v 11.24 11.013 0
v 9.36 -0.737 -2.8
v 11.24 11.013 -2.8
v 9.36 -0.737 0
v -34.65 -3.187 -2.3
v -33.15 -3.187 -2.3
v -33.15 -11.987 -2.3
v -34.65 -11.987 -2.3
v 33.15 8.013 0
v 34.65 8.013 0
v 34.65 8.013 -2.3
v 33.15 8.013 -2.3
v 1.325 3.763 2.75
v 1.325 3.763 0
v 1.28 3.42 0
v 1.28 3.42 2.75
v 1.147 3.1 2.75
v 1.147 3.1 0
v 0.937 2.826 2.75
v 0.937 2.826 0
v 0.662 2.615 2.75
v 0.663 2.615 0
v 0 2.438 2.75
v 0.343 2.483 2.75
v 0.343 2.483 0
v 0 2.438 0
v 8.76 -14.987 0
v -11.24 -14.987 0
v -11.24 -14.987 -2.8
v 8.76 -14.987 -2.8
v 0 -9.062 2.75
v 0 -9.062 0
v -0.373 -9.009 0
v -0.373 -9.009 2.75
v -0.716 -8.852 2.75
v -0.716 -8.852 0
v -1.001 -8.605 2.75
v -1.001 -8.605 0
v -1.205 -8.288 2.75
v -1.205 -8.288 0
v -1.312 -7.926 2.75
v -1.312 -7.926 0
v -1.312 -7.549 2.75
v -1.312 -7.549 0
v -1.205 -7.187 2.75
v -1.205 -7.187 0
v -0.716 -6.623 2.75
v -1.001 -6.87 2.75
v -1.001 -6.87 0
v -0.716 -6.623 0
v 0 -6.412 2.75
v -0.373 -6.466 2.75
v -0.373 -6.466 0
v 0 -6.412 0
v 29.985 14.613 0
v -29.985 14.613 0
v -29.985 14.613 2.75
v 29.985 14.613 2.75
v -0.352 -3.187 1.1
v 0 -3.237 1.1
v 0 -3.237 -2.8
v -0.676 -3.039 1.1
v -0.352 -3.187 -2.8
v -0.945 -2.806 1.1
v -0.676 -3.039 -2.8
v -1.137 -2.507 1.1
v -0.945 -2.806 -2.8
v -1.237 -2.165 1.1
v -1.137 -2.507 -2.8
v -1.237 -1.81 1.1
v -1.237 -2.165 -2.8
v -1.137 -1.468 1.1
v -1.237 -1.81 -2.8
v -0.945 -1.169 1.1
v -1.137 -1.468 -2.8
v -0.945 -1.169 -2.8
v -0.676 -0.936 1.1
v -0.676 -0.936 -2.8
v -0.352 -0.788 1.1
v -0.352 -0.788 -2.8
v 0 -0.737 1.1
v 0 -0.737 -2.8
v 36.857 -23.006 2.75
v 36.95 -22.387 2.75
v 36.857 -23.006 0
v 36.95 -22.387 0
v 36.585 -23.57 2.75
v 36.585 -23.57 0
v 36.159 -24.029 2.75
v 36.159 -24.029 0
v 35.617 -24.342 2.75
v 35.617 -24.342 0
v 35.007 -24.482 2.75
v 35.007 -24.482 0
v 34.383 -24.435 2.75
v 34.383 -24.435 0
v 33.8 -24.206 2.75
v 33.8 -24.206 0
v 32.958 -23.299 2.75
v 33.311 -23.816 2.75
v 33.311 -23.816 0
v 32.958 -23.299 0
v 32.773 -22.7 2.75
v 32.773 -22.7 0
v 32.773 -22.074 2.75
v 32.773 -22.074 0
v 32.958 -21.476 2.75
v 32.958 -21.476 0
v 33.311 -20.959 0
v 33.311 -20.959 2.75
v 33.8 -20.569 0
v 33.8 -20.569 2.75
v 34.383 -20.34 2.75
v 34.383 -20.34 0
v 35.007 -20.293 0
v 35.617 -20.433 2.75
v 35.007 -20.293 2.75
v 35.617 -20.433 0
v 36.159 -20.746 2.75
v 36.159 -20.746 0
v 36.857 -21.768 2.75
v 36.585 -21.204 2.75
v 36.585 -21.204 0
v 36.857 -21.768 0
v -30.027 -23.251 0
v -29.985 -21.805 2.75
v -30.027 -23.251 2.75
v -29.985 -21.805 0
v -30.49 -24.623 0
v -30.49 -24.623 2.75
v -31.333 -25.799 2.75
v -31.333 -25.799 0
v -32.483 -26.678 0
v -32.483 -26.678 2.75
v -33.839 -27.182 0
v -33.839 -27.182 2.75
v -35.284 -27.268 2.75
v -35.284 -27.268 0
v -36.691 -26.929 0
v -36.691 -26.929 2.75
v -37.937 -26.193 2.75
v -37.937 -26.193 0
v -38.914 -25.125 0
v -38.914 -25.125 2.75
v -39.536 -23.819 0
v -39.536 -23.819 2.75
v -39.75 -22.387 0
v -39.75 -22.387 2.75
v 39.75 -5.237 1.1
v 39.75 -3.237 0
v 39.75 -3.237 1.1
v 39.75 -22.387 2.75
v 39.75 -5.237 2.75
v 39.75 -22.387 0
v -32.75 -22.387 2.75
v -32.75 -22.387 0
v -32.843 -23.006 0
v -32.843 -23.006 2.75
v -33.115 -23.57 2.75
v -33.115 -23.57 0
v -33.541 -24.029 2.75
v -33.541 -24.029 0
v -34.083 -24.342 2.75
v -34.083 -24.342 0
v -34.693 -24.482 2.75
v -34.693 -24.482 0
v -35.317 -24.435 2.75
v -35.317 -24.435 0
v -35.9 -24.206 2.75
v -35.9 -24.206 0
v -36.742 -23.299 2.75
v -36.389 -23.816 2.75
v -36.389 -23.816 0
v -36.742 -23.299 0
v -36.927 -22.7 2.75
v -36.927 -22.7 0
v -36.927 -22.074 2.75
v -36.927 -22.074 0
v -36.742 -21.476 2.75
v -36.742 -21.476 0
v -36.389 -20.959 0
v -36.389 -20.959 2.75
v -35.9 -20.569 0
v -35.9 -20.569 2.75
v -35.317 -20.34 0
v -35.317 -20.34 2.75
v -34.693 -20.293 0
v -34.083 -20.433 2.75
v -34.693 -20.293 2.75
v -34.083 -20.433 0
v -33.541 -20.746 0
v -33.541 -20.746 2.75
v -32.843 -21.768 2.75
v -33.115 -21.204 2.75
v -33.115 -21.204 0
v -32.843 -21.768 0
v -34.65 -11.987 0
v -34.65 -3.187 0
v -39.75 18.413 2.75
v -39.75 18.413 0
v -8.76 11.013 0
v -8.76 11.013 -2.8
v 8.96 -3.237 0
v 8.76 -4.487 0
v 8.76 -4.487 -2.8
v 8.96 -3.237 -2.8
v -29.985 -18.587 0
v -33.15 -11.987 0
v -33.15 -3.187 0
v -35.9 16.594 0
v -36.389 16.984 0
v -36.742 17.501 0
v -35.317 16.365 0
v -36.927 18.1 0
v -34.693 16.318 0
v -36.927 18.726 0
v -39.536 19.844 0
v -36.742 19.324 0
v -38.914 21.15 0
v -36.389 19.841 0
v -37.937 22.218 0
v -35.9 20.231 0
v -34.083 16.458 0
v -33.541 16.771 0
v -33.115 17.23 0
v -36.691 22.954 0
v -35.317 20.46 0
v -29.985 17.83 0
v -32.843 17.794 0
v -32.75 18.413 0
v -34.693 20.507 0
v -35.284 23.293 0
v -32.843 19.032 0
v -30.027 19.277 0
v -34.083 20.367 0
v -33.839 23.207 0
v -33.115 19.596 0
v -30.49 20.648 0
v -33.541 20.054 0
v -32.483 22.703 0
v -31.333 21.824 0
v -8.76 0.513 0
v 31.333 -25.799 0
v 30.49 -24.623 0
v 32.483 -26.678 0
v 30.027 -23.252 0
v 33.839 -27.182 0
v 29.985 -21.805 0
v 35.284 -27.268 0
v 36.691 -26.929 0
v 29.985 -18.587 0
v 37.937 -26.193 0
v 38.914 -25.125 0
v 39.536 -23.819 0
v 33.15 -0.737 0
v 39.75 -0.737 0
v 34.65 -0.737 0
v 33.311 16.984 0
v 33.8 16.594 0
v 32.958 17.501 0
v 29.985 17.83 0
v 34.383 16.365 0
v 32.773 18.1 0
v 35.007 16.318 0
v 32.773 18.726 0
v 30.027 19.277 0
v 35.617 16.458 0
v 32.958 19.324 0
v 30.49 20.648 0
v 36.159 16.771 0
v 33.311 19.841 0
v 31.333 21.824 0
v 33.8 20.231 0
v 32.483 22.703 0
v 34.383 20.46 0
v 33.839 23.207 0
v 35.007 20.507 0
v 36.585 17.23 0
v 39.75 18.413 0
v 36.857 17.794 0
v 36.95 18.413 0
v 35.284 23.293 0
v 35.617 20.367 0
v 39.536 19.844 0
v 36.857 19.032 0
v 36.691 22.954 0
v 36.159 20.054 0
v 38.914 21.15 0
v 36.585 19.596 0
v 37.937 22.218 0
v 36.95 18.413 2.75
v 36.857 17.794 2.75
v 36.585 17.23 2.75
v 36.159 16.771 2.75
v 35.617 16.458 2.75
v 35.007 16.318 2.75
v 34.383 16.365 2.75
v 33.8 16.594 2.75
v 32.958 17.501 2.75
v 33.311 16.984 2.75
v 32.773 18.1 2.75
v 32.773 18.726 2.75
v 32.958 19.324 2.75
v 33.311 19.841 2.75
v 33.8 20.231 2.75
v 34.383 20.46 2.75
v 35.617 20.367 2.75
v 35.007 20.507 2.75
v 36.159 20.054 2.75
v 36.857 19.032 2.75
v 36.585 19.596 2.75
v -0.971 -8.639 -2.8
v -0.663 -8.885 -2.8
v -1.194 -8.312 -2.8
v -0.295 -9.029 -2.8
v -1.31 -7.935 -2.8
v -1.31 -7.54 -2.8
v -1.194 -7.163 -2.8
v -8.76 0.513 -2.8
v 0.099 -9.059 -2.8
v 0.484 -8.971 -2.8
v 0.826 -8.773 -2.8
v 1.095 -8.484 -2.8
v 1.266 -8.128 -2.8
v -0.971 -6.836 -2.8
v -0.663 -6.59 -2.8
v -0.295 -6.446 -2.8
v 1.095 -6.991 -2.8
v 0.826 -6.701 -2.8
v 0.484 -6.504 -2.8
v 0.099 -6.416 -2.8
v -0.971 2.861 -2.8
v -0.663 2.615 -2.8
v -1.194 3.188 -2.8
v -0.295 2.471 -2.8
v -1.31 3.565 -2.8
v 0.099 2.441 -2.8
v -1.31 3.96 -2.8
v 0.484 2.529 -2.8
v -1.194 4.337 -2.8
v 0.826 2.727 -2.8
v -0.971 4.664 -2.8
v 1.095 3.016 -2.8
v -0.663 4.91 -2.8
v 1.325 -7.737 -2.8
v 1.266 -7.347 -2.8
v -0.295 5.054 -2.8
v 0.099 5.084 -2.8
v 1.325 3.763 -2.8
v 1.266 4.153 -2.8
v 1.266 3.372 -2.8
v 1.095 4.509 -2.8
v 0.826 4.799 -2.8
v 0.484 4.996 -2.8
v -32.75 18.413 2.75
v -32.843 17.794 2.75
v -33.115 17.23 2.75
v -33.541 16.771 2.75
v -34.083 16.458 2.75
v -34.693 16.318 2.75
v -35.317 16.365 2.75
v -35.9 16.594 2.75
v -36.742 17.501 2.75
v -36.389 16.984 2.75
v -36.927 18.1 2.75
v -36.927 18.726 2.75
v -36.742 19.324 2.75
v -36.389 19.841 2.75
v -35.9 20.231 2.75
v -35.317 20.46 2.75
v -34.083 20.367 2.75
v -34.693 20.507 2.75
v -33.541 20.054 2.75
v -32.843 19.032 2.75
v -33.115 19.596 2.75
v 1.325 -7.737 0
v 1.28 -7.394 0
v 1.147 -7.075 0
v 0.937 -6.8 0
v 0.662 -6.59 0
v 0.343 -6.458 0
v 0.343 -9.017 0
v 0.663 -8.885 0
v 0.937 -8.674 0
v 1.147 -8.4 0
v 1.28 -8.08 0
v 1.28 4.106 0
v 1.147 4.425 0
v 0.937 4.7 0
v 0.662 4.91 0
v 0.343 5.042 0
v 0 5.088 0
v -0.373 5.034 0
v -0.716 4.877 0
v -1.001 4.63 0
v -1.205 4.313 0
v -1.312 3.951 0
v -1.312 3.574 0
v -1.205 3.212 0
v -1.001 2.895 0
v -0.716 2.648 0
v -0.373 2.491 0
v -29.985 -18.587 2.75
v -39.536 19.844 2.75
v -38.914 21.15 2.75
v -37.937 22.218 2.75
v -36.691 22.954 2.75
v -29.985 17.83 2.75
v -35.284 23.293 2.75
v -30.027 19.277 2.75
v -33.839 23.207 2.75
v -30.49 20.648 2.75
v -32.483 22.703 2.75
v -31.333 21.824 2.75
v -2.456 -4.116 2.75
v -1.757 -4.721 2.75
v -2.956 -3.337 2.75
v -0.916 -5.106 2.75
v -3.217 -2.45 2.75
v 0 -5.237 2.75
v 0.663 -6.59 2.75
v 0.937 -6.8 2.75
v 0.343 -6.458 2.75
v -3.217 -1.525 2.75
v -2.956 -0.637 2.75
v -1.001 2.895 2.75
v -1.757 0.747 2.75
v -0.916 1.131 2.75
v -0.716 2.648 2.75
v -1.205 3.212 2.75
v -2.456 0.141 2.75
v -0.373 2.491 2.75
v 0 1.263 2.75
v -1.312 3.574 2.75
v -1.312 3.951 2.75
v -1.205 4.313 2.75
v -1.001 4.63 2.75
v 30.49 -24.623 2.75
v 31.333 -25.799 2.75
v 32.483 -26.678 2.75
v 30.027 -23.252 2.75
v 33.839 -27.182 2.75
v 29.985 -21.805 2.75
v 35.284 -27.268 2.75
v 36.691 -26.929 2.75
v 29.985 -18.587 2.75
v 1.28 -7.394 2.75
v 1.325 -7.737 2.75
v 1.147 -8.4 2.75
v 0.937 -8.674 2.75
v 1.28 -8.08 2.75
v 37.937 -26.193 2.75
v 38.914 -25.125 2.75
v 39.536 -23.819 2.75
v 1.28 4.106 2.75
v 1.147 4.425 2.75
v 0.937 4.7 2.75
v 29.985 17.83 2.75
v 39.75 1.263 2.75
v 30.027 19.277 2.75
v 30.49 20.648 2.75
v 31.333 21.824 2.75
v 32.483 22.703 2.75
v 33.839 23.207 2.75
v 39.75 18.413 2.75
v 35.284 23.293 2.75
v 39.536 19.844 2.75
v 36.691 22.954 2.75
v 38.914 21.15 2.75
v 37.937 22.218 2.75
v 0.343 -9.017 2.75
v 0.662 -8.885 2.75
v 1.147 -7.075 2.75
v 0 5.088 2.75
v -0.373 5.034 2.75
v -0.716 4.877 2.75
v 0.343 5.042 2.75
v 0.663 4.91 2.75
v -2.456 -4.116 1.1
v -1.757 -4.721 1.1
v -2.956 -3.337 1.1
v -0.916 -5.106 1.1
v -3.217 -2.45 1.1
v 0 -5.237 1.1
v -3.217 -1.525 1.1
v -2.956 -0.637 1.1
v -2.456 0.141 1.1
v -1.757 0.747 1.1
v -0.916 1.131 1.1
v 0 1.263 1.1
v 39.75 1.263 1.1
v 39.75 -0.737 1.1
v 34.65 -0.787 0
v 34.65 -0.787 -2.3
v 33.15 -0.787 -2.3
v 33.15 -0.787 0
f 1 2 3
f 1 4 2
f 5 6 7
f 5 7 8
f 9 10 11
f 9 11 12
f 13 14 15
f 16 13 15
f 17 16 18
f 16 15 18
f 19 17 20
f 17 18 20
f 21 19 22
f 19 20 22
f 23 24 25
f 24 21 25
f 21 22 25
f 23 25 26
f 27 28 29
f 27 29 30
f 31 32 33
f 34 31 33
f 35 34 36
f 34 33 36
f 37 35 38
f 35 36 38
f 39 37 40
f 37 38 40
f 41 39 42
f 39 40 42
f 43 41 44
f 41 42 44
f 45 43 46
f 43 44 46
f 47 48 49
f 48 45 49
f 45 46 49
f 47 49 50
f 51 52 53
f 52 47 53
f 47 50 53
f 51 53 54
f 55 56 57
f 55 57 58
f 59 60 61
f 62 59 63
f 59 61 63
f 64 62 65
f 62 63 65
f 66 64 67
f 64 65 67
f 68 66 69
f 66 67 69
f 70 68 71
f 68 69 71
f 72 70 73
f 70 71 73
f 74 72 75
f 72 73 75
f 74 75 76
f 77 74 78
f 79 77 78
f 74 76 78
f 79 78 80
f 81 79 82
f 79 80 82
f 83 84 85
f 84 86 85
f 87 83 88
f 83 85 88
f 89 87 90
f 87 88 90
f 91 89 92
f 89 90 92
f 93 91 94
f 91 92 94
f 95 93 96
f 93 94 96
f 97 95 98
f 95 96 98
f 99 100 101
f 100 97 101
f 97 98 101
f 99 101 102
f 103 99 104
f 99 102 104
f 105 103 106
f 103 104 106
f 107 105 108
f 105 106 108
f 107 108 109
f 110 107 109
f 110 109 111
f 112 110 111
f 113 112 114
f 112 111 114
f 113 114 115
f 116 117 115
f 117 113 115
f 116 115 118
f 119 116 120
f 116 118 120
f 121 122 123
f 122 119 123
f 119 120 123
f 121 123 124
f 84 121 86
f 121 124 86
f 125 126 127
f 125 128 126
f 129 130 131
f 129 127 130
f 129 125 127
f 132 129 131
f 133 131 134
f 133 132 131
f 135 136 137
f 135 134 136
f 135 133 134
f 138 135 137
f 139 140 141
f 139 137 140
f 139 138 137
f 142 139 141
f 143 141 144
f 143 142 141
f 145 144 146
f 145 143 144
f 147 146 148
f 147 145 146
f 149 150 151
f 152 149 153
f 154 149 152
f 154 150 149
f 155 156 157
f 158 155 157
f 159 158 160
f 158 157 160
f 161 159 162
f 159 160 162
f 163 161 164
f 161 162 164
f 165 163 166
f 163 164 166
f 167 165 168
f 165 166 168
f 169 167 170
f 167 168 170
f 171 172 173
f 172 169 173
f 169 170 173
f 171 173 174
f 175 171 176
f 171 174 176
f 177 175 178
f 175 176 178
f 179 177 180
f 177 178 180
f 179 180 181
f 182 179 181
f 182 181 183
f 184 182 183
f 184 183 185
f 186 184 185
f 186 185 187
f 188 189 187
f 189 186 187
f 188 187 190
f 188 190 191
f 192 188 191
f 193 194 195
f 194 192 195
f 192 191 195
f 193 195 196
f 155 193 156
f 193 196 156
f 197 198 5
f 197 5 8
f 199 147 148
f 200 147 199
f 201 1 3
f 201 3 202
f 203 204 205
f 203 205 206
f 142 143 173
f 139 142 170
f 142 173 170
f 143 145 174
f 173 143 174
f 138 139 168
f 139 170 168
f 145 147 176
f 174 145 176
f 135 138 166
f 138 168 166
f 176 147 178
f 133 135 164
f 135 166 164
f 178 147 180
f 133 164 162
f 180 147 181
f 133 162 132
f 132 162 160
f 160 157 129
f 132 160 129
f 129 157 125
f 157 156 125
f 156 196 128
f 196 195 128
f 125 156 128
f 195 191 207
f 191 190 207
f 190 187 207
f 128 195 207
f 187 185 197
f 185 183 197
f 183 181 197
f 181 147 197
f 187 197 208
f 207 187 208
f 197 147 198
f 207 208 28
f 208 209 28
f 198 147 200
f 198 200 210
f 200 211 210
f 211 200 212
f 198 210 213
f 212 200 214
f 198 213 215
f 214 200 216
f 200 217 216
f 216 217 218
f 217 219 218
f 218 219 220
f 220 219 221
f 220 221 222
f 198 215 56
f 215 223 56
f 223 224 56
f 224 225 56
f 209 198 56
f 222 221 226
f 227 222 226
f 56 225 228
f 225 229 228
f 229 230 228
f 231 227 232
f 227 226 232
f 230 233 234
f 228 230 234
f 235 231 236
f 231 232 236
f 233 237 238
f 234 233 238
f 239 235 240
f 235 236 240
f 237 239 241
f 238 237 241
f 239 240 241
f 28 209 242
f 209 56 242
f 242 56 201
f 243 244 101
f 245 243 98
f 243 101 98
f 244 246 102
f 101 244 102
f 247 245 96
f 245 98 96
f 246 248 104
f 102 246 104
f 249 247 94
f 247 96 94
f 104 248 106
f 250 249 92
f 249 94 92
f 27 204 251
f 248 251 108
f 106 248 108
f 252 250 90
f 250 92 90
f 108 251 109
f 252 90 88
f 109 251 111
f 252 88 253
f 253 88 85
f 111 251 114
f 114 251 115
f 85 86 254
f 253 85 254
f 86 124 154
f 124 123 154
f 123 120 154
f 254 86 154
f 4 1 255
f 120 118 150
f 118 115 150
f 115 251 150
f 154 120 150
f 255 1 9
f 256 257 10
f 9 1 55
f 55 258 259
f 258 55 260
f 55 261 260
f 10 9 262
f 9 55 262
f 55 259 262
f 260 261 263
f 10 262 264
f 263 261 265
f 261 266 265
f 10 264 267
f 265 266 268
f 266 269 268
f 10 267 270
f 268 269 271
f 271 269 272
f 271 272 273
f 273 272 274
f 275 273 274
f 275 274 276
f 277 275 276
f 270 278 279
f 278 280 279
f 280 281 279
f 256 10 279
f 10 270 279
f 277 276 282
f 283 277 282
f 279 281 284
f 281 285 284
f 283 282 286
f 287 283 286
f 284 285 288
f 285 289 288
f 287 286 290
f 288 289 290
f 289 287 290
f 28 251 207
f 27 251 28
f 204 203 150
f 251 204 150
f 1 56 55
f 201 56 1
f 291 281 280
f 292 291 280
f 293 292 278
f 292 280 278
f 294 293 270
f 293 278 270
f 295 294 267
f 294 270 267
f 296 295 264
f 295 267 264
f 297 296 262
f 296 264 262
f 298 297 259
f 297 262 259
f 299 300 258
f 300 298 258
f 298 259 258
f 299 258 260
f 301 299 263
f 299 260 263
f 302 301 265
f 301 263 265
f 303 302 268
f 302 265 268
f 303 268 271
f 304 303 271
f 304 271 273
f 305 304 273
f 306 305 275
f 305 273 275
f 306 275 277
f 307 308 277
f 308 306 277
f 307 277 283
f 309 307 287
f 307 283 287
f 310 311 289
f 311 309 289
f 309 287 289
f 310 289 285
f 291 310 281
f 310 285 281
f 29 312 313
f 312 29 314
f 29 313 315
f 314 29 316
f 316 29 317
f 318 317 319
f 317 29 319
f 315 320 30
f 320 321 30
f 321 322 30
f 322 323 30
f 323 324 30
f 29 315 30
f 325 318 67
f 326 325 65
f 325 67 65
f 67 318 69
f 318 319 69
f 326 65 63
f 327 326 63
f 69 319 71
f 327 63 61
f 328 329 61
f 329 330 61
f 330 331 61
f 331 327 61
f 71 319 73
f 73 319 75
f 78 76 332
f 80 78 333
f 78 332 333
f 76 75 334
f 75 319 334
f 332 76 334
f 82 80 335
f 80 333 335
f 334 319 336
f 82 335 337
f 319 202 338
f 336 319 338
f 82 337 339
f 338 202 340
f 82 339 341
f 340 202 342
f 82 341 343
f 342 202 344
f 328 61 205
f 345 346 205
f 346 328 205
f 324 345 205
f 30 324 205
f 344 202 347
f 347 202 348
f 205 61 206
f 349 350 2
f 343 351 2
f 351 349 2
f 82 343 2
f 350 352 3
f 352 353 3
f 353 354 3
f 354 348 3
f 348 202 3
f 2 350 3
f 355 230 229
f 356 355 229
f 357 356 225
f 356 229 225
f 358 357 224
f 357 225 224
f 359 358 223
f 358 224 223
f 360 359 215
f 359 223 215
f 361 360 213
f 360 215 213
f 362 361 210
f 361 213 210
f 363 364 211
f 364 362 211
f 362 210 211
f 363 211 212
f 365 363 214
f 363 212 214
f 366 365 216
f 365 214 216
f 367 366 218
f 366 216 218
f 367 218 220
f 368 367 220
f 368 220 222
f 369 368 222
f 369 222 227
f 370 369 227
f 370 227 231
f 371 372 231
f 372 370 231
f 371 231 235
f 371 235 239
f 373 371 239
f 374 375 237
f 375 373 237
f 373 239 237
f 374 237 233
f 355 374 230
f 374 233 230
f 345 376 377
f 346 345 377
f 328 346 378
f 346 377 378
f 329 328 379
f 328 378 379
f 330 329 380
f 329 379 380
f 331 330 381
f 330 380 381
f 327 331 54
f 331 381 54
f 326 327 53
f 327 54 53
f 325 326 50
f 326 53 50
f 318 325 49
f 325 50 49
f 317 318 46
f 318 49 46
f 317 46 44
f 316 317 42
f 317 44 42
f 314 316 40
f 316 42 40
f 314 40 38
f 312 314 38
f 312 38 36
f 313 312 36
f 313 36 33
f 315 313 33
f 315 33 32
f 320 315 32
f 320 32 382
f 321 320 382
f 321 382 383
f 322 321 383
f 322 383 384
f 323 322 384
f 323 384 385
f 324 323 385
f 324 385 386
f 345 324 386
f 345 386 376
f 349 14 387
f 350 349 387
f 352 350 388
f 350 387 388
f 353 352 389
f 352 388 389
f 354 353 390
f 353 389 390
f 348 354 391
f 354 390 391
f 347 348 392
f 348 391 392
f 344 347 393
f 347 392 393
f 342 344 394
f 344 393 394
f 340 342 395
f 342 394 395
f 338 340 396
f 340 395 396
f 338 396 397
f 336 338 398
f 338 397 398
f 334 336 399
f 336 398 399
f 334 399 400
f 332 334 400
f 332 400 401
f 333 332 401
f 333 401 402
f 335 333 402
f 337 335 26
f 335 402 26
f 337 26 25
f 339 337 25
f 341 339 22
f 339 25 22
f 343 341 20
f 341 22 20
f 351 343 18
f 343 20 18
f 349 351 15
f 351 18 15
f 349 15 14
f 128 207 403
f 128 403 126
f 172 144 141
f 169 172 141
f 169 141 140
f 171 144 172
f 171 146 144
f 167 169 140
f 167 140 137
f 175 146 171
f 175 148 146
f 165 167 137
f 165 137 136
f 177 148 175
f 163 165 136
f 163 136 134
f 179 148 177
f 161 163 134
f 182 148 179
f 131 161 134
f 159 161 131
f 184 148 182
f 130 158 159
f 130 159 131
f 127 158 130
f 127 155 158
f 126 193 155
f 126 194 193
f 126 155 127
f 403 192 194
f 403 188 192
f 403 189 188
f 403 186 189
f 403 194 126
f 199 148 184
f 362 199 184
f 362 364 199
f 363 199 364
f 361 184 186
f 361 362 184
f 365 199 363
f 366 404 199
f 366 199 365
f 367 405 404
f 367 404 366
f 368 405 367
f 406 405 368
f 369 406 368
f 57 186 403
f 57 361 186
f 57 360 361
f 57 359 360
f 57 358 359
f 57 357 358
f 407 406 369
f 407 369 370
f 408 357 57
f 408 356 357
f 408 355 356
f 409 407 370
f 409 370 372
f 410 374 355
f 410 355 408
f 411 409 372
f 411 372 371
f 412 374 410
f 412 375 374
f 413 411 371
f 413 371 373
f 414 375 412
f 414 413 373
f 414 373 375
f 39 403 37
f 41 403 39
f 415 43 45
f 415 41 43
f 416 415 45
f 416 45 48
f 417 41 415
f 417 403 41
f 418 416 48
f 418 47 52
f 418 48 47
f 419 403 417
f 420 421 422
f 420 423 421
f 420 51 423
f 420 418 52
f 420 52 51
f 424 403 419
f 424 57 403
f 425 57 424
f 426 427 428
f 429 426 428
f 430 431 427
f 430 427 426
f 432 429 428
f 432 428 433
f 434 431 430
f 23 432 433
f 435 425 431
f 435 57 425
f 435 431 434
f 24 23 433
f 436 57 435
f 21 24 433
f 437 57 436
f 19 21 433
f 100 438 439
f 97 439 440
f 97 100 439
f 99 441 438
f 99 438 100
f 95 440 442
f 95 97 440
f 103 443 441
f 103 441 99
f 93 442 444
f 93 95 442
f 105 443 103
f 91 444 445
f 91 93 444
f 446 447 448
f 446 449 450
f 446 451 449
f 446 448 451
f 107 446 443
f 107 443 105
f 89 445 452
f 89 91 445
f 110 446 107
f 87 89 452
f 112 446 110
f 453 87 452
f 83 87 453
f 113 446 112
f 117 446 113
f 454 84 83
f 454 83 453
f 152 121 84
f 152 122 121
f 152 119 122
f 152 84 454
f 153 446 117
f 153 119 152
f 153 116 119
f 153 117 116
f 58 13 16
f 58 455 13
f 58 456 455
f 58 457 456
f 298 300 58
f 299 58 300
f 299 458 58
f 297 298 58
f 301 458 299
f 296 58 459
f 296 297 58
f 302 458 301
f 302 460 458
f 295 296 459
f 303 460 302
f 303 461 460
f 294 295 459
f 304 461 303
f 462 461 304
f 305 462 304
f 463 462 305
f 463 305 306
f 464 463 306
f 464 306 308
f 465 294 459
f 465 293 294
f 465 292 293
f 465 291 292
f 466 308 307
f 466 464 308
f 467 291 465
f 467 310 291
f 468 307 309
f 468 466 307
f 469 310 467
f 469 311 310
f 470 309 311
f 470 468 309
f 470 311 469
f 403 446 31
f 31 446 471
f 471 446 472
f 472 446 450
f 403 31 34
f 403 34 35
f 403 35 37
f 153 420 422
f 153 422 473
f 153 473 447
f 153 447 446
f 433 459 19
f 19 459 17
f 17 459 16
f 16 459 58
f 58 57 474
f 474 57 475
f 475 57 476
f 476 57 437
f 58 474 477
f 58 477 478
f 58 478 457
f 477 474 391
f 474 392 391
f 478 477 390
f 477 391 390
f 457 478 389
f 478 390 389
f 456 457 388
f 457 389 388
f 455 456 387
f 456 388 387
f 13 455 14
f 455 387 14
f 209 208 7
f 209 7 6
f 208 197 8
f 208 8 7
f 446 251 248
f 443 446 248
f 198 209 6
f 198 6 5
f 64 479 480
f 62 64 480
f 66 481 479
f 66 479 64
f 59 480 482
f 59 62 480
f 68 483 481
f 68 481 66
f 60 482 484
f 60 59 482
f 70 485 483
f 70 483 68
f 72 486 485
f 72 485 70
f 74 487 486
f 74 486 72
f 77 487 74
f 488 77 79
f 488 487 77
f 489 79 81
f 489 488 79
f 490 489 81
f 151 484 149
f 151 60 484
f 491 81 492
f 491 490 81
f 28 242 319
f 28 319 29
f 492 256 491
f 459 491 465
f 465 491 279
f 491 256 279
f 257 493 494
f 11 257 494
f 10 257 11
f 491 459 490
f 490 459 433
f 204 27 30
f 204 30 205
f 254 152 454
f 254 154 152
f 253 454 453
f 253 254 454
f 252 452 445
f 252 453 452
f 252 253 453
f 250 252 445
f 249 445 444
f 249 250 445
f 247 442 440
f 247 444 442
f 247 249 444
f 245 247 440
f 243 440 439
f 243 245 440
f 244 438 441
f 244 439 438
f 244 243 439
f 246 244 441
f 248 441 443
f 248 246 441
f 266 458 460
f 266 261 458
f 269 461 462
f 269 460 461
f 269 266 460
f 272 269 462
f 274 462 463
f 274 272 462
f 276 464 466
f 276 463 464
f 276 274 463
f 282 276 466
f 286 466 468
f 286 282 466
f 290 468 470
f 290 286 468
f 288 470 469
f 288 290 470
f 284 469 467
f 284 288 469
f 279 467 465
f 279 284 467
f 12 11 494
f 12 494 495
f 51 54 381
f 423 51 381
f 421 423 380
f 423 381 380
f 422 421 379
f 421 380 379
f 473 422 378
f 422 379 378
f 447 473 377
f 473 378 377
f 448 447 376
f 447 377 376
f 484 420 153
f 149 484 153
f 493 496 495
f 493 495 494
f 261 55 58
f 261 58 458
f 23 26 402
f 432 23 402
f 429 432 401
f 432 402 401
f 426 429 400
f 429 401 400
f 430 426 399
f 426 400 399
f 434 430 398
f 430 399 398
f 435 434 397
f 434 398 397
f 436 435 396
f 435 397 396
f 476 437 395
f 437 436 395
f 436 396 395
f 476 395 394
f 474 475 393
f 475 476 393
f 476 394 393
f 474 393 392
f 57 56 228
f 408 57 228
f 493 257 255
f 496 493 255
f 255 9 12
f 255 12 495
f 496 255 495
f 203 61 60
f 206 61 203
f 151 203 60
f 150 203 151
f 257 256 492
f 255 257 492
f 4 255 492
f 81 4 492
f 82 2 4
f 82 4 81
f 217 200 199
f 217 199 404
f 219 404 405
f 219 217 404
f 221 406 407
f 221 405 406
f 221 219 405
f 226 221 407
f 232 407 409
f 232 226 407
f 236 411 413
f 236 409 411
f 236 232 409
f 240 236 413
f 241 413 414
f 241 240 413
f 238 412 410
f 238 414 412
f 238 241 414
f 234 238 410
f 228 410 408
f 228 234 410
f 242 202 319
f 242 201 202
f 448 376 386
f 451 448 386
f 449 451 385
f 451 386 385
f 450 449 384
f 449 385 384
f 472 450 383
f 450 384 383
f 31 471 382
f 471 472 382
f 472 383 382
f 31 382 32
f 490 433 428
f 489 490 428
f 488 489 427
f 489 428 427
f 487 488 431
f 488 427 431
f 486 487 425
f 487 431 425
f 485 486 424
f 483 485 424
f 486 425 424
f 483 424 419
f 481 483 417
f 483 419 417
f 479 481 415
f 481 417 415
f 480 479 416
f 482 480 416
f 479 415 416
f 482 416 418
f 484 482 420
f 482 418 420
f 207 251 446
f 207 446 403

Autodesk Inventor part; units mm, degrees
ref_plane "YZ Plane" through (0, 0, 0) normal (1, 0, 0) x (0, 1, 0)
ref_plane "XZ Plane" through (0, 0, 0) normal (0, 1, 0) x (-1, 0, 0)
ref_plane "XY Plane" through (0, 0, 0) normal (0, 0, 1) x (1, 0, 0)
sketch "Sketch1" plane through (0, 0, 0) normal (0, 0, 1) x (1, 0, 0)
  line L0 (-8.76, 11.0126) -> (-8.76, 0.5126)
  line L1 (-8.76, 0.5126) -> (-11.24, -14.9874)
  line L2 (-11.24, -14.9874) -> (8.76, -14.9874)
  line L3 (8.76, -14.9874) -> (8.76, -4.4874)
  line L4 (11.24, 11.0126) -> (-8.76, 11.0126)
  line L5 (0, 12.916) -> (0, -18.5653)
  line L6 (-8.76, 0.5126) -> (13.6474, 0.5126) construction
  line L7 (8.76, -4.4874) -> (-2.6872, -4.4874) construction
  line L8 (-5.8361, -1.9874) -> (18.6079, -1.9874) construction
  circle A0 centre (0, -7.7374) radius 1.325
  circle A1 centre (0, 3.7626) radius 1.325
  line L9 (22.7948, -1.9874) -> (0, -1.9874) construction
  line L10 (9.36, -0.7374) -> (0, -0.7374)
  line L11 (0, -3.2374) -> (8.96, -3.2374)
  arc A2 (0, -0.7374) -> (0, -3.2374) centre (0, -1.9874) ccw
  line L12 (8.76, -4.4874) -> (8.96, -3.2374)
  line L13 (9.36, -0.7374) -> (11.24, 11.0126)
  point P0 (0, 0)
  point P1 (-8.76, -4.4874)
  point P2 (11.3974, -1.9874)
  dimension "d0" = 2.48
  dimension "d1" = 15.5
  dimension "d2" = 15.5
  dimension "d3" = 2.48
  dimension "d4" = 10.5
  dimension "d5" = 10.5
  dimension "d6" = 20
  dimension "d7" = 20
  dimension "d8" = 2.65
  dimension "d9" = 7.25
  dimension "d12" = 2.5
  dimension "d26" = 11.75
  dimension "d27" = 14.25
extrude "Extrusion1" add sketch "Sketch1" against normal blind 2.8 contours L4 L5 A1 A2 A0 L2 L1 L0 | L4 L13 L10 L5 A1 | L5 A0 L11 L12 L3 L2
sketch "Sketch2" plane through (0, 0, 0) normal (0, 0, 1) x (1, 0, 0)
  line L0 (-39.75, -18.5874) -> (-39.75, 14.6126)
  line L1 (0, 12.916) -> (0, -18.5653) construction
  line L2 (-5.8361, -1.9874) -> (18.6079, -1.9874) construction
  line L3 (-39.75, 14.6126) -> (-39.75, 18.4126)
  line L4 (-29.9847, 14.6126) -> (-29.9847, 17.8301)
  arc A0 (-29.9847, 17.8301) -> (-39.75, 18.4126) centre (-34.85, 18.4126) ccw
  line L5 (0, 12.916) -> (0, -18.5653)
  circle A1 centre (-34.85, 18.4126) radius 2.1
  arc A2 (0, -0.7374) -> (0, -3.2374) centre (0, -1.9874) ccw projected
  line L6 (-1.25, -1.9874) -> (17.7749, -1.9874) construction
  line L7 (0, -3.2374) -> (39.75, -3.2374)
  line L8 (39.75, -0.7374) -> (0, -0.7374)
  arc A3 (0, -0.7374) -> (0, -3.2374) centre (0, -1.9874) ccw
  line L9 (39.75, 14.6126) -> (39.75, -0.7374)
  line L10 (39.75, -3.2374) -> (39.75, -18.5874)
  line L11 (27.8114, -18.5874) -> (2.6919, -18.5874)
  line L12 (29.9847, -18.5874) -> (-29.9847, -18.5874)
  circle A4 centre (0, 3.7626) radius 1.325 projected
  circle A5 centre (0, -7.7374) radius 1.325 projected
  line L13 (-29.9847, 14.6126) -> (29.9847, 14.6126)
  line L14 (39.75, 14.6126) -> (39.75, 18.4126)
  line L15 (29.9847, 14.6126) -> (29.9847, 17.8301)
  arc A6 (39.75, 18.4126) -> (29.9847, 17.8301) centre (34.85, 18.4126) ccw
  circle A7 centre (34.85, 18.4126) radius 2.1
  line L16 (-39.75, -18.5874) -> (-39.75, -22.3874)
  line L17 (-29.9847, -18.5874) -> (-29.9847, -21.8049)
  arc A8 (-39.75, -22.3874) -> (-29.9847, -21.8049) centre (-34.85, -22.3874) ccw
  circle A9 centre (-34.85, -22.3874) radius 2.1
  line L18 (29.9847, -18.5874) -> (29.9847, -21.8049)
  circle A10 centre (34.85, -22.3874) radius 2.1
  line L19 (39.75, -18.5874) -> (39.75, -22.3874)
  arc A11 (29.9847, -21.8049) -> (39.75, -22.3874) centre (34.85, -22.3874) ccw
  point P0 (0, 0)
  point P1 (8.2624, -1.9874)
  point P2 (27.8114, 14.6126)
  dimension "d15" = 4.9
  dimension "d16" = 4.2
  dimension "d25" = 79.5
extrude "Extrusion2" add sketch "Sketch2" along normal blind 2.75 contours L0 L3 A0 L4 L13 L15 A6 L14 L9 L8 A2 L7 L10 L19 A11 L18 L12 L11 L17 A8 L16
sketch "Sketch3" plane through (0, 0, 2.75) normal (0, 0, 1) x (1, 0, 0)
  arc A0 (0, -0.7374) -> (0, -3.2374) centre (0, -1.9874) ccw projected
  line L0 (0, -1.9874) -> (45.1297, -1.9874) construction
  line L1 (0, -5.2374) -> (45.1297, -5.2374)
  line L2 (45.1297, 1.2626) -> (0, 1.2626)
  arc A1 (0, 1.2626) -> (0, -5.2374) centre (0, -1.9874) ccw
  arc A2 (45.1297, -5.2374) -> (45.1297, 1.2626) centre (45.1297, -1.9874) ccw
  point P0 (0, 0)
  point P1 (22.5649, -1.9874)
  dimension "d20" = 3.25
extrude "Extrusion3" cut sketch "Sketch3" against normal blind 1.65
sketch "Sketch4" plane through (0, 0, 0) normal (0, 0, -1) x (-1, 0, 0)
  line L0 (-34.65, 8.0126) -> (-33.15, 8.0126)
  line L1 (-33.15, 8.0126) -> (-33.15, -0.7874)
  line L2 (-33.15, -0.7874) -> (-34.65, -0.7874)
  line L3 (-34.65, -0.7874) -> (-34.65, 8.0126)
  line L4 (-39.75, -0.7374) -> (-39.75, 18.4126) projected
  line L5 (-29.9847, 14.6126) -> (29.9847, 14.6126) projected
  line L6 (33.15, -3.1874) -> (34.65, -3.1874)
  line L7 (34.65, -3.1874) -> (34.65, -11.9874)
  line L8 (34.65, -11.9874) -> (33.15, -11.9874)
  line L9 (33.15, -11.9874) -> (33.15, -3.1874)
  line L10 (39.75, 18.4126) -> (39.75, -22.3874) projected
  line L11 (29.9847, -18.5874) -> (-29.9847, -18.5874) projected
  point P0 (0, 0)
  point P1 (-39.75, 8.8376)
  dimension "d28" = 5.1
  dimension "d29" = 6.6
  dimension "d30" = 8.8
  dimension "d31" = 1.5
  dimension "d32" = 5.1
  dimension "d33" = 6.6
  dimension "d34" = 8.8
  dimension "d35" = 1.5
extrude "Extrusion4" add sketch "Sketch4" along normal blind 2.3
properties part number "Gripper_BackPlate"
